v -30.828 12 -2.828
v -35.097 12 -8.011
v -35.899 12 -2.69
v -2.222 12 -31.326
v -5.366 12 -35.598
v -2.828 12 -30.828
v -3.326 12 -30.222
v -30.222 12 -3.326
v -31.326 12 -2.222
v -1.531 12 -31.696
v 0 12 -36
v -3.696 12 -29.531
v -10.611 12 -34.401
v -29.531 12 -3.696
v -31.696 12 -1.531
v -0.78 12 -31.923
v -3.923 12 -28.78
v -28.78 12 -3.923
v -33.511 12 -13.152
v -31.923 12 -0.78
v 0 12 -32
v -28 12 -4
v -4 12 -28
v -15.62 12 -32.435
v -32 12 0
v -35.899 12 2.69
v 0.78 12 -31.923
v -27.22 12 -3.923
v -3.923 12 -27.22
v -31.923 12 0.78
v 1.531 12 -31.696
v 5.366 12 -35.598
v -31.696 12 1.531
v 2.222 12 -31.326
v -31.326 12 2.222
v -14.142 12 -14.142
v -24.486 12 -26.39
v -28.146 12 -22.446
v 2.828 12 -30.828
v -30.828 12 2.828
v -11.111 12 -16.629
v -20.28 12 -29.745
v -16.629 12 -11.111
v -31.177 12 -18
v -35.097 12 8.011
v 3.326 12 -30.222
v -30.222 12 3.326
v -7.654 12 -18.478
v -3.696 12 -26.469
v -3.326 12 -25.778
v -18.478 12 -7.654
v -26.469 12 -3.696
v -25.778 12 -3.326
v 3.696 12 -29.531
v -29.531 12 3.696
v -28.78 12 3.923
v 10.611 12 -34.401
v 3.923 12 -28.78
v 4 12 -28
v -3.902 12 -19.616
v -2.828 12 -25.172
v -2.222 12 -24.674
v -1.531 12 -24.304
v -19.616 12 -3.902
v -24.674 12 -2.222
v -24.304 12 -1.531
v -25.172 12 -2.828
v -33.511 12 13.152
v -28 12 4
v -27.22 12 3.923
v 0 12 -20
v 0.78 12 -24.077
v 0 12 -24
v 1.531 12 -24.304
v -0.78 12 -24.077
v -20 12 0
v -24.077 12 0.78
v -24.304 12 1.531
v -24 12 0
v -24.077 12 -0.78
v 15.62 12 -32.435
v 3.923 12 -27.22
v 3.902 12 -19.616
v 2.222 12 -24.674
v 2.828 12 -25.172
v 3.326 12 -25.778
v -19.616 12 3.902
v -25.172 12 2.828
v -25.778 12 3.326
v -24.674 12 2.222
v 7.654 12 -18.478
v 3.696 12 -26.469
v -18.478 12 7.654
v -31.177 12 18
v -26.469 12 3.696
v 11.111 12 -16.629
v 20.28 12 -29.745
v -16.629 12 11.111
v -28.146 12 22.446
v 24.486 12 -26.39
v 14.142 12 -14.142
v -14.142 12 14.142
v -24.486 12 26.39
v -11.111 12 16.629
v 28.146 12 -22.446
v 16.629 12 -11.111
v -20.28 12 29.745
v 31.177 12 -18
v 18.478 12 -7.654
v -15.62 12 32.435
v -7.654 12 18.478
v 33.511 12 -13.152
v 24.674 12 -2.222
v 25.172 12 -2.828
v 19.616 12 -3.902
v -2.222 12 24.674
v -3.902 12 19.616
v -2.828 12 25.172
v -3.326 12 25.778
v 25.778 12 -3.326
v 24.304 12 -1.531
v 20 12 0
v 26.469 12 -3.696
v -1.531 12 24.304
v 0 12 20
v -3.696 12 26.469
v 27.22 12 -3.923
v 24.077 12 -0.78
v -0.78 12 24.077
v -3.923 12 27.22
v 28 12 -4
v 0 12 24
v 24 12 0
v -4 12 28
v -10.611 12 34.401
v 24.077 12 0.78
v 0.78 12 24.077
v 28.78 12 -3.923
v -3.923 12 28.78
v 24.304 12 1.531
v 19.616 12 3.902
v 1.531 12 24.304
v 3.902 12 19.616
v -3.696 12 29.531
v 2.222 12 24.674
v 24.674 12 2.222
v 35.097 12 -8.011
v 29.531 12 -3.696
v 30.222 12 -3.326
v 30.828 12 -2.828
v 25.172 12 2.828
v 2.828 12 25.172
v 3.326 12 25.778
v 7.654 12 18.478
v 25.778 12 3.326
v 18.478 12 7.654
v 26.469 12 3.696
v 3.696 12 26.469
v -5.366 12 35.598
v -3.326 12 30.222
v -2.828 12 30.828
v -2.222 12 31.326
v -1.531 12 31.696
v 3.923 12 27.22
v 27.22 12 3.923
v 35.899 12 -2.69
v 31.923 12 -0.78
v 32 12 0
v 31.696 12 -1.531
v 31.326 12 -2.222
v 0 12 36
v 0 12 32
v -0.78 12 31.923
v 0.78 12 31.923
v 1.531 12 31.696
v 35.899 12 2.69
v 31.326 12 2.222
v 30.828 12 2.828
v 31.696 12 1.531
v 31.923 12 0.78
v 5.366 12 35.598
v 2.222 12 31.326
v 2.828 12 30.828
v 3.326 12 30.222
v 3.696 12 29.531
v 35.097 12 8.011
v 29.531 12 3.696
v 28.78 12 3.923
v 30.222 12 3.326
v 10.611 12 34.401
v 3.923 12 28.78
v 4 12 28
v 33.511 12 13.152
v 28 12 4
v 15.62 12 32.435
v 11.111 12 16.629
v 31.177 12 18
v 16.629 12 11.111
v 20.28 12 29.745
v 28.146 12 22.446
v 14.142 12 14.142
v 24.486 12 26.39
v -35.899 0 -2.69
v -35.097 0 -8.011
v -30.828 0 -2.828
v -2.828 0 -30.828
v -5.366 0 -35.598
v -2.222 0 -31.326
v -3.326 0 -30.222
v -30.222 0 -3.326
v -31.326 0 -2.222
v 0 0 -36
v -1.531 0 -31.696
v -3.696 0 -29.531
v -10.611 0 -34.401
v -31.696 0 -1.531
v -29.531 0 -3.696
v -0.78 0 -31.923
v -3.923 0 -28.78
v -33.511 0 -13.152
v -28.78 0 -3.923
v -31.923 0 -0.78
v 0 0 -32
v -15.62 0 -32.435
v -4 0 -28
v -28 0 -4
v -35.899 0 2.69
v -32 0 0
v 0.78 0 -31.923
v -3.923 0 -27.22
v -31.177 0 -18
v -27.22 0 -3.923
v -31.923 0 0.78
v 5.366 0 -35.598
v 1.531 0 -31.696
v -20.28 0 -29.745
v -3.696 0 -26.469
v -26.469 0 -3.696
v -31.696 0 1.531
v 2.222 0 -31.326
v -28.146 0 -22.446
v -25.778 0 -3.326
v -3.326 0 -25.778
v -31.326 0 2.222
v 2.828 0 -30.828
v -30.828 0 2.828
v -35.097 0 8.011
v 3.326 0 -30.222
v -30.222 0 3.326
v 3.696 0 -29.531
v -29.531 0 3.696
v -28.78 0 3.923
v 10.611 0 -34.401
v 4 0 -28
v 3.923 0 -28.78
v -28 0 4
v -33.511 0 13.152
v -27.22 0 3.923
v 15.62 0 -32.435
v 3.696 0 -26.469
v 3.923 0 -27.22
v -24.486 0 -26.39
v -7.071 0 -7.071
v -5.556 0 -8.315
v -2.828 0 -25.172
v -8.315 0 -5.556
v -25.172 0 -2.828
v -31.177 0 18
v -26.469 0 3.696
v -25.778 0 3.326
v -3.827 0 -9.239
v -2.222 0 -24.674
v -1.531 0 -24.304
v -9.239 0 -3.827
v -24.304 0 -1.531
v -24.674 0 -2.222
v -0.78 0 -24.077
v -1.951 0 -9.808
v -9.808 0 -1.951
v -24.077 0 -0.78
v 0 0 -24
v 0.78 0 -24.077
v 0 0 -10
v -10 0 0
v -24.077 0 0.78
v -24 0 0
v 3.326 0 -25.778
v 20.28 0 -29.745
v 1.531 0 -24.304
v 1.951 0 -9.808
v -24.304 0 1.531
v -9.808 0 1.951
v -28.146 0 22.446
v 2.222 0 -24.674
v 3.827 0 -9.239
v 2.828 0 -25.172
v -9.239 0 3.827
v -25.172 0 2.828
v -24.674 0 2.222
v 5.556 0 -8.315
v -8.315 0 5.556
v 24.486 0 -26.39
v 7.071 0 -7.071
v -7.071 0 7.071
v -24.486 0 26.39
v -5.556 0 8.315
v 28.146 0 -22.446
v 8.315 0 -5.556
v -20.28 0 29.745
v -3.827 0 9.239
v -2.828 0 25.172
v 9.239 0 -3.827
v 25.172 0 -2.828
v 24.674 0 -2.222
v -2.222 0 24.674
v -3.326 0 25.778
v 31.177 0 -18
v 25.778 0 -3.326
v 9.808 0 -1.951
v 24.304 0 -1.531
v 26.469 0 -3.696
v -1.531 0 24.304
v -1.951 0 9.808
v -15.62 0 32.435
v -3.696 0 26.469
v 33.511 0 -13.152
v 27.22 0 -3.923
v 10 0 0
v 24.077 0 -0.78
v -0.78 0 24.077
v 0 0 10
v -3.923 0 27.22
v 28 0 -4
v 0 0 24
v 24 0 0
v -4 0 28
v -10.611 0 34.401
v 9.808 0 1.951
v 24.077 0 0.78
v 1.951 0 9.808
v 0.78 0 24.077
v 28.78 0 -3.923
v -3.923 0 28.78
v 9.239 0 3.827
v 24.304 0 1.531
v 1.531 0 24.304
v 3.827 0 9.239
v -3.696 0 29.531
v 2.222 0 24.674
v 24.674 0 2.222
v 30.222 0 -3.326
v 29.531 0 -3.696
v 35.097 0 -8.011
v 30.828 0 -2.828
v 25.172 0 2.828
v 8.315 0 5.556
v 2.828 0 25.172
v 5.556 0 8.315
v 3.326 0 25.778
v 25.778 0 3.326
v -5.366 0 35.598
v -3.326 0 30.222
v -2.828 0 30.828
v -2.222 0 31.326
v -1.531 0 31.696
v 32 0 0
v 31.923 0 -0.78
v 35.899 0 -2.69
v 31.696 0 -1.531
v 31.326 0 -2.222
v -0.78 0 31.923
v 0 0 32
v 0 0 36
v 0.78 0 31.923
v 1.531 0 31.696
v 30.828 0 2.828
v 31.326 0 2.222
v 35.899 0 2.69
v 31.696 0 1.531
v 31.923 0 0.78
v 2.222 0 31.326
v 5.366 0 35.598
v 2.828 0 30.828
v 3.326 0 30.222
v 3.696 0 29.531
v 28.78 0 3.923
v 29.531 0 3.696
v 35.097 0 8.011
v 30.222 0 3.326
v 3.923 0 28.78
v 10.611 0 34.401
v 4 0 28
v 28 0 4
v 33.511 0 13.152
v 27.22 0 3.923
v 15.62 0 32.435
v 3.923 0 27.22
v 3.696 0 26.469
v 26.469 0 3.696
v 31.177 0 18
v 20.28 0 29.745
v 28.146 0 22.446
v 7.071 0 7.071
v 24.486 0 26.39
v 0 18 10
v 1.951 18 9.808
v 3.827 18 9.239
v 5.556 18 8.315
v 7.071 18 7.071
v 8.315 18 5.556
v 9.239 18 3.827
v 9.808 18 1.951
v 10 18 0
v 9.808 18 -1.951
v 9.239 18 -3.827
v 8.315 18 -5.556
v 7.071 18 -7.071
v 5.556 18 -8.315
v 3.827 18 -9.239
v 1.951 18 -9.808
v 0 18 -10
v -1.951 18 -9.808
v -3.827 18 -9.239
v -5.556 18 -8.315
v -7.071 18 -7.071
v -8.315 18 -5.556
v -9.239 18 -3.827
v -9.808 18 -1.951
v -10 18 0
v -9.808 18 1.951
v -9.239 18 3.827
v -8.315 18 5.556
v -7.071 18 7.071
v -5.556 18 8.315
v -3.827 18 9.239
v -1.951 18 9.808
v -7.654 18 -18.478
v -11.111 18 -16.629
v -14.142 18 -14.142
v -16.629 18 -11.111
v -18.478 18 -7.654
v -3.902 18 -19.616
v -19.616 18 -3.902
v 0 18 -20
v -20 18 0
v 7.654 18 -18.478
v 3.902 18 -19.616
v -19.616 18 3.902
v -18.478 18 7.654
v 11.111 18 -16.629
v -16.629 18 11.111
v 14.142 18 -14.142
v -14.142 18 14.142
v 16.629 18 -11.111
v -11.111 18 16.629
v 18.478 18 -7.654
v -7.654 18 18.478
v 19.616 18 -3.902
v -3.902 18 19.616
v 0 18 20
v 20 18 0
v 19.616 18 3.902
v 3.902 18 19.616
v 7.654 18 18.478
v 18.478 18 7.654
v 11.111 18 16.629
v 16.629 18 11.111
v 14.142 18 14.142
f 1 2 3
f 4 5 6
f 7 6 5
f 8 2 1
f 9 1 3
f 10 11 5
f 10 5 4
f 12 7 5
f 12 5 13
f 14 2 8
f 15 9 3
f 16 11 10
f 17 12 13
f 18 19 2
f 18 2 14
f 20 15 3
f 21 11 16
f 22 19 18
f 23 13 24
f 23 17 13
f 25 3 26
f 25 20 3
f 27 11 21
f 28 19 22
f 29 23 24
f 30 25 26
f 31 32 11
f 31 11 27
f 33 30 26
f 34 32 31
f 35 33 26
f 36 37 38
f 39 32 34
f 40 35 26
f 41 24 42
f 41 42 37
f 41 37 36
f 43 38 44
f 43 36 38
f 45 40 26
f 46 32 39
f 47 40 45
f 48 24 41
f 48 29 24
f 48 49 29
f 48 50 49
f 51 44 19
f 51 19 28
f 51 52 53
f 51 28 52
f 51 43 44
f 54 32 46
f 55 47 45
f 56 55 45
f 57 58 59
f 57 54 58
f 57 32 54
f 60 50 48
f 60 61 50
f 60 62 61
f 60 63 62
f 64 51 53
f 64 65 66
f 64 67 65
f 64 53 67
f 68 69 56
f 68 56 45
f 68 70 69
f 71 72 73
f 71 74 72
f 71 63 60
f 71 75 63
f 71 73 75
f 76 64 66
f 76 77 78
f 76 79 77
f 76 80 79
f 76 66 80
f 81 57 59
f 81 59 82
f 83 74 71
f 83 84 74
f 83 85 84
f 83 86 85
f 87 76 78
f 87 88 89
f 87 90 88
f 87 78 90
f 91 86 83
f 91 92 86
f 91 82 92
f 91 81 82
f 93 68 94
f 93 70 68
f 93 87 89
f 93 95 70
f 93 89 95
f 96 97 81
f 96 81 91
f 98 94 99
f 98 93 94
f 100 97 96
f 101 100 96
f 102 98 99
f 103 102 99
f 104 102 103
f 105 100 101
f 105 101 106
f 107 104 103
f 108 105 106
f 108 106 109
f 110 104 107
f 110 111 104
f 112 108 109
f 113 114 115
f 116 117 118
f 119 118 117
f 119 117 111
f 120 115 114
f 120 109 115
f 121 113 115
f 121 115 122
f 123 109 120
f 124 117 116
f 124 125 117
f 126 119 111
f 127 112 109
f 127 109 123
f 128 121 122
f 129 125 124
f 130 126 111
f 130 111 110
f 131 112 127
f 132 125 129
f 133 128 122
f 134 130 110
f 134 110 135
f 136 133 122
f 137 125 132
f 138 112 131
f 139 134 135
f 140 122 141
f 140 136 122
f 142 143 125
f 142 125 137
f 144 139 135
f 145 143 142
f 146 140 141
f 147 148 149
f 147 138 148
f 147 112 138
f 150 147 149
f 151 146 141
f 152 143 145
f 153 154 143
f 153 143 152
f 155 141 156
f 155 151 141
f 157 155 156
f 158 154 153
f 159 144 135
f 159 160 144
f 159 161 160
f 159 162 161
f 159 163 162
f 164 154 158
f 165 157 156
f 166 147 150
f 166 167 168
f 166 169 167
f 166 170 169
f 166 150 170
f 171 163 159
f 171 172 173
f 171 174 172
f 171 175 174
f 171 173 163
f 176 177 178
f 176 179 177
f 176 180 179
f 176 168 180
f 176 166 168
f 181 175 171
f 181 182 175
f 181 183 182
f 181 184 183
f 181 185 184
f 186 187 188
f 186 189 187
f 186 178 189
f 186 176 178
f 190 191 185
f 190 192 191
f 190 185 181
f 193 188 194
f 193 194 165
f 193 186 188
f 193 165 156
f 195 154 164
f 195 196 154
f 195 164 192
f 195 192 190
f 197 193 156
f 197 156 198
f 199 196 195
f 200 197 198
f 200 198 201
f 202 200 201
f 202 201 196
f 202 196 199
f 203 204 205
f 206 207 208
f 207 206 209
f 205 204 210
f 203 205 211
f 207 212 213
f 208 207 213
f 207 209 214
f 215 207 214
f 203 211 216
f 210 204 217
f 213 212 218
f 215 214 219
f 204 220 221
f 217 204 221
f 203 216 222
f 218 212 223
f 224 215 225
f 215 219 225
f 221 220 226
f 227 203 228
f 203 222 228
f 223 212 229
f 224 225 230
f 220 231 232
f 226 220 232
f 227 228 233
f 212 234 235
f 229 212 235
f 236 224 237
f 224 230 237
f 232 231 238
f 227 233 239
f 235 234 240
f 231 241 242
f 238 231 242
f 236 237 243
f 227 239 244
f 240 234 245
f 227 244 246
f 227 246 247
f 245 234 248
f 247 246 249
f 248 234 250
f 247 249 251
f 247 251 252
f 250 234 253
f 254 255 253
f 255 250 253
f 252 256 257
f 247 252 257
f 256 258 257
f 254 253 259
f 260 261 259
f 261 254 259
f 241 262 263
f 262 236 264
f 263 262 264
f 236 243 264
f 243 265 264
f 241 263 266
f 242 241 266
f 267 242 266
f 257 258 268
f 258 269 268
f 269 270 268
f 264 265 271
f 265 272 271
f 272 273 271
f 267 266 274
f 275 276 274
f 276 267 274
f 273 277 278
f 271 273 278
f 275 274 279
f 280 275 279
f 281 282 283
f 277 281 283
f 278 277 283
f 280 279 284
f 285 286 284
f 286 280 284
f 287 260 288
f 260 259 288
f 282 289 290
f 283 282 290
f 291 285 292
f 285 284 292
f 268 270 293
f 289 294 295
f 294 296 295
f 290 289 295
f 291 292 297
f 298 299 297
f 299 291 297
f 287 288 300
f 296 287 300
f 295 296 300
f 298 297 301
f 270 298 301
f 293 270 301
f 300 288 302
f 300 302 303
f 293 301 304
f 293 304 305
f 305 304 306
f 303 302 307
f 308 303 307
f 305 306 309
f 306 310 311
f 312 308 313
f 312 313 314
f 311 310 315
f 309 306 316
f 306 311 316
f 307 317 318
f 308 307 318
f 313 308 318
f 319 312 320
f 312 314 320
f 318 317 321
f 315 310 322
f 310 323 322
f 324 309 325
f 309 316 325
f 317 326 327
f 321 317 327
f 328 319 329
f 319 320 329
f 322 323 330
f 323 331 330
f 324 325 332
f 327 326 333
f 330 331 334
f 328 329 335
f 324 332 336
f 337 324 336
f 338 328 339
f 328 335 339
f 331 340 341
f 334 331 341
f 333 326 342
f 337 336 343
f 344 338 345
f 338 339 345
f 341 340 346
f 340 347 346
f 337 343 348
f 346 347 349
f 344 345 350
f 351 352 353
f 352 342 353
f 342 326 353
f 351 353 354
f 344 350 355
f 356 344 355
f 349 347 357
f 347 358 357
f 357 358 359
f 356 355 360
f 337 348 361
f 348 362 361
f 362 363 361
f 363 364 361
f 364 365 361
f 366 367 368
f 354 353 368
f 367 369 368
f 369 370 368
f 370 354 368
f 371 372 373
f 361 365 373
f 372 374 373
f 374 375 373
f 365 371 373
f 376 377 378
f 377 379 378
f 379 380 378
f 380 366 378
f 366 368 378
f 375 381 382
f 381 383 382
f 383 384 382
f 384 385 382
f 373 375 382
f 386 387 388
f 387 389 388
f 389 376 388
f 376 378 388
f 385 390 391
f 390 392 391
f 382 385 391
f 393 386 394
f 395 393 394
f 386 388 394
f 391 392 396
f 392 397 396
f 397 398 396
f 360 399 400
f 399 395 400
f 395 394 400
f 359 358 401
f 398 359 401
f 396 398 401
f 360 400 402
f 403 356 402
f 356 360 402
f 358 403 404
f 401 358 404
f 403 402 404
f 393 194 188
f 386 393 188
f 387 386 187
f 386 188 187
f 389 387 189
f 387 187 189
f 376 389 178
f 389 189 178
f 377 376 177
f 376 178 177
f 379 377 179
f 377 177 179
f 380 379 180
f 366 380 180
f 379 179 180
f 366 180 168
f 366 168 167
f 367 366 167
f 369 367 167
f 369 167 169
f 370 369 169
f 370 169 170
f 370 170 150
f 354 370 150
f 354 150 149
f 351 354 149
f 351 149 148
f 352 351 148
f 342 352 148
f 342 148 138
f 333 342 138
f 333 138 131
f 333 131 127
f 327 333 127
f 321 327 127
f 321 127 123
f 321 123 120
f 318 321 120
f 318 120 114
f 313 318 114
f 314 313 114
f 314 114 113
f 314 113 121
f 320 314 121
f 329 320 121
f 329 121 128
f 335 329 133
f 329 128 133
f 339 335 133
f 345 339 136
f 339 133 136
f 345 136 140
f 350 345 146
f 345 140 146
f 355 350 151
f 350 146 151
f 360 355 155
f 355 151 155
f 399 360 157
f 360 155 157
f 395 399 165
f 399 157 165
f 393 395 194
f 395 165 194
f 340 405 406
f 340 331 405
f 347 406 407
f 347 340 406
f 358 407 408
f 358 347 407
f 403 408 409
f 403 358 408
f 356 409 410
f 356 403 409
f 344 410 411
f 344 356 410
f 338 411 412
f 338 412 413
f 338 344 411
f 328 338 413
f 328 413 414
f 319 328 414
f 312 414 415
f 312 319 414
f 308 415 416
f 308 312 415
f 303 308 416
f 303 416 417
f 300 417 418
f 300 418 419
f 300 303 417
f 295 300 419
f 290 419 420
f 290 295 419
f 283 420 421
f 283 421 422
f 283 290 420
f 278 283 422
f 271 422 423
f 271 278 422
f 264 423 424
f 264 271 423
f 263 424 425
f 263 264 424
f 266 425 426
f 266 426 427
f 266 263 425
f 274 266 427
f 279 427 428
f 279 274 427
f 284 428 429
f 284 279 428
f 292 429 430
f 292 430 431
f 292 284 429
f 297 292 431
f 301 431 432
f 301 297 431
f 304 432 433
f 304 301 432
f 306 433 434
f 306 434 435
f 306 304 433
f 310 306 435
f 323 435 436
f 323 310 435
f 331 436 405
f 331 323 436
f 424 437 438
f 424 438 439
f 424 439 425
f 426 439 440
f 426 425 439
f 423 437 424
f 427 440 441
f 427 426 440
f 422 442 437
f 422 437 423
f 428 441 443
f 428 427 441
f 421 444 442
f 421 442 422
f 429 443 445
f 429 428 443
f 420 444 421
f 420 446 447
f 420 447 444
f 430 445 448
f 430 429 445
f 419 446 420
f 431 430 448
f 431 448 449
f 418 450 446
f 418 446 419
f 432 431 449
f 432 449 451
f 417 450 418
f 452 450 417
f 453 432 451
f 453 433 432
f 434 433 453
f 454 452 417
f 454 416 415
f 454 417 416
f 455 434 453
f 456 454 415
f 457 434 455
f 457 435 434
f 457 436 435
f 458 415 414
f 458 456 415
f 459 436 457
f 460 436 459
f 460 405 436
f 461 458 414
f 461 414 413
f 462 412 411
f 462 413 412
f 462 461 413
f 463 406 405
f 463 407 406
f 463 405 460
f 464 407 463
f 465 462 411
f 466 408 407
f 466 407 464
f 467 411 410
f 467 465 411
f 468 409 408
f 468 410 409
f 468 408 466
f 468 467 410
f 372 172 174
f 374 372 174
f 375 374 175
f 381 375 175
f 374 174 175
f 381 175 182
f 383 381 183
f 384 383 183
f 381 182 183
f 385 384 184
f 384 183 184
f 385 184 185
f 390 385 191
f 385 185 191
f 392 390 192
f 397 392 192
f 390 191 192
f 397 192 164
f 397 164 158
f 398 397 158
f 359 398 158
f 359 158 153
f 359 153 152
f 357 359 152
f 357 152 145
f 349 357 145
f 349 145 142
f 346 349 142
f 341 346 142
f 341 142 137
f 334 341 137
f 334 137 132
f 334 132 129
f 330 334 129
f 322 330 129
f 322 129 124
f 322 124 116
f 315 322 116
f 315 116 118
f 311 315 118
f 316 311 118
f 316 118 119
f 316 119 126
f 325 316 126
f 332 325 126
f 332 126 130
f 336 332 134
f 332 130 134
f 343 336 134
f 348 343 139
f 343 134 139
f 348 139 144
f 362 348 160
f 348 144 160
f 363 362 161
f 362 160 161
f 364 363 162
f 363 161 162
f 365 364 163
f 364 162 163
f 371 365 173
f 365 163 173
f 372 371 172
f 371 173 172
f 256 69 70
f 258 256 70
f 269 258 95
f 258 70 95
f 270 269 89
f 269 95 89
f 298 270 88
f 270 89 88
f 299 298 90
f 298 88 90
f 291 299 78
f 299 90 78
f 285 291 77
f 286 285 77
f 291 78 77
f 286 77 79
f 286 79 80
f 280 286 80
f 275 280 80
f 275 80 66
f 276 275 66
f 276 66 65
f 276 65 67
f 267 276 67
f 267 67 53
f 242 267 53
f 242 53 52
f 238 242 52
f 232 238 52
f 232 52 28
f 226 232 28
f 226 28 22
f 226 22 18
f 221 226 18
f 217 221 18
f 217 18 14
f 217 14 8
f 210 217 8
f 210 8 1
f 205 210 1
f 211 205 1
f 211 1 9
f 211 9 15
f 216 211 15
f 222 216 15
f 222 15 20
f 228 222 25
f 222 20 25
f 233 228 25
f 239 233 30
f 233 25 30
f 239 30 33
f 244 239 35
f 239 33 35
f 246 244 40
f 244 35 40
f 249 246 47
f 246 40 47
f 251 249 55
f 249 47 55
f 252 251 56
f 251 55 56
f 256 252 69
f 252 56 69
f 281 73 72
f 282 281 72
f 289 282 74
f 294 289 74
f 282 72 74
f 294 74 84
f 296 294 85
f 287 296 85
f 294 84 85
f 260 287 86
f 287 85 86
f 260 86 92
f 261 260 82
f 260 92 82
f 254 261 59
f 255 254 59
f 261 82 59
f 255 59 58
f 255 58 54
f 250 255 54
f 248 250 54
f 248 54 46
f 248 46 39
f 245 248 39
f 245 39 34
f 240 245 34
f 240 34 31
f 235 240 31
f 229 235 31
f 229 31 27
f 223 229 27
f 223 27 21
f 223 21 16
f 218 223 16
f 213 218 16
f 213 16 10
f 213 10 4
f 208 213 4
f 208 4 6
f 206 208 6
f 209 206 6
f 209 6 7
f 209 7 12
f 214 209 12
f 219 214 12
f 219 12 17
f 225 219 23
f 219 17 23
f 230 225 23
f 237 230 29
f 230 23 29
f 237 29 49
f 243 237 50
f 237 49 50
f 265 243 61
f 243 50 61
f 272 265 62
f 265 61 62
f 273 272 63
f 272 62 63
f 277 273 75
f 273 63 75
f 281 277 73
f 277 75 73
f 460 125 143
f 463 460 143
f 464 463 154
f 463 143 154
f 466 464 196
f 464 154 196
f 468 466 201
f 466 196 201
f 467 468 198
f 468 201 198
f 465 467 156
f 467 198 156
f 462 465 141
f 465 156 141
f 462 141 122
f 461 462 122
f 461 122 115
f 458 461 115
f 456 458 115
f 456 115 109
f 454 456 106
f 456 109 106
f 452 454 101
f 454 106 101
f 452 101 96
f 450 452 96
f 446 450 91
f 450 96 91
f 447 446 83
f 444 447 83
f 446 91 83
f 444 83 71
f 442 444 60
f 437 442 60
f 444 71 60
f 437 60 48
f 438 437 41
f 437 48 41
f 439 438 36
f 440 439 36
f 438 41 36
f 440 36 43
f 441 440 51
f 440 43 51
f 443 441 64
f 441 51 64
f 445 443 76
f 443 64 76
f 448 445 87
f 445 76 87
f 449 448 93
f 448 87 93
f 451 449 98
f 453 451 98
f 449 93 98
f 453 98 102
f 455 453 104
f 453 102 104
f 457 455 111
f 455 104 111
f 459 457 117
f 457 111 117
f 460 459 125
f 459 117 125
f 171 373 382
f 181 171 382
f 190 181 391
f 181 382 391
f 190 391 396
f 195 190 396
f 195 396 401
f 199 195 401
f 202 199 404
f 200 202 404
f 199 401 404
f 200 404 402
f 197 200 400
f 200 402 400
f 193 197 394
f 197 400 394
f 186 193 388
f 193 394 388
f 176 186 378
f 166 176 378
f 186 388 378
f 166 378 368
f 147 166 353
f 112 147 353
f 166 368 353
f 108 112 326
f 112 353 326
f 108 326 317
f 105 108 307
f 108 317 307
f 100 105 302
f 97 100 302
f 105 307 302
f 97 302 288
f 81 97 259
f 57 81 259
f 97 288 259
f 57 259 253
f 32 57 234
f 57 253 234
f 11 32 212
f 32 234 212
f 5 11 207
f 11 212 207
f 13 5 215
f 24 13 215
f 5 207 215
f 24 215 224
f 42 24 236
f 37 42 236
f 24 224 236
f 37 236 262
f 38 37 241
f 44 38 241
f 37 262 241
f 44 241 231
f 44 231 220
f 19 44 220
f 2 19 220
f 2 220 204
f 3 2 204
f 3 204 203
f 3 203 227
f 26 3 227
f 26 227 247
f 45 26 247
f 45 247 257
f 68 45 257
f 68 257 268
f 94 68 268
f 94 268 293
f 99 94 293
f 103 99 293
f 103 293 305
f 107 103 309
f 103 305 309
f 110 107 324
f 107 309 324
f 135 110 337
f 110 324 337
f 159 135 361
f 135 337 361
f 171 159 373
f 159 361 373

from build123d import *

# Parameters (mm, degrees)
SKETCH1_R           = 36
SKETCH1_R_2         = 10
BOSS_EXTRUDE1_DEPTH = 12
SKETCH2_R           = 20
SKETCH2_R_2         = 10
BOSS_EXTRUDE2_DEPTH = 6
CUT_EXTRUDE1_REACH  = 54.307
SKETCH3_R           = 4


with BuildPart() as part:
    # Sketch1 → Boss-Extrude1 (new body)
    with BuildSketch(Plane(origin=(0, 0, 0), x_dir=(1, 0, 0), z_dir=(0, 1, 0))):
        with Locations(Location((0, 0, 0), (0, 0, 270))):
            Circle(SKETCH1_R)
        with Locations(Location((0, 0, 0), (0, 0, 270))):
            Circle(SKETCH1_R_2, mode=Mode.SUBTRACT)
    extrude(amount=BOSS_EXTRUDE1_DEPTH)

    # Sketch2 → Boss-Extrude2 (add)
    with BuildSketch(Plane(origin=(0, 12, 0), x_dir=(1, 0, 0), z_dir=(0, 1, 0))):
        with Locations(Location((0, 0, 0), (0, 0, 270))):
            Circle(SKETCH2_R)
        with Locations(Location((0, 0, 0), (0, 0, 270))):
            Circle(SKETCH2_R_2, mode=Mode.SUBTRACT)
    extrude(amount=BOSS_EXTRUDE2_DEPTH)

    # Sketch3 → Cut-Extrude1 (cut, up to next)
    with BuildSketch(Plane(origin=(0, 12, 0), x_dir=(1, 0, 0), z_dir=(0, 1, 0)), mode=Mode.PRIVATE) as cut_extrude1_sk1:
        with Locations(Location((0, -28, 0), (0, 0, 270))):
            Circle(SKETCH3_R)
    cut_extrude1_tool1 = extrude(cut_extrude1_sk1.sketch, amount=-CUT_EXTRUDE1_REACH, mode=Mode.PRIVATE) & part.part
    # Sketch3 → Cut-Extrude1 (cut, up to next)
    with BuildSketch(Plane(origin=(0, 12, 0), x_dir=(1, 0, 0), z_dir=(0, 1, 0)), mode=Mode.PRIVATE) as cut_extrude1_sk2:
        with Locations(Location((-28, 0, 0), (0, 0, 270))):
            Circle(SKETCH3_R)
    cut_extrude1_tool2 = extrude(cut_extrude1_sk2.sketch, amount=-CUT_EXTRUDE1_REACH, mode=Mode.PRIVATE) & part.part
    # Sketch3 → Cut-Extrude1 (cut, up to next)
    with BuildSketch(Plane(origin=(0, 12, 0), x_dir=(1, 0, 0), z_dir=(0, 1, 0)), mode=Mode.PRIVATE) as cut_extrude1_sk3:
        with Locations(Location((0, 28, 0), (0, 0, 270))):
            Circle(SKETCH3_R)
    cut_extrude1_tool3 = extrude(cut_extrude1_sk3.sketch, amount=-CUT_EXTRUDE1_REACH, mode=Mode.PRIVATE) & part.part
    # Sketch3 → Cut-Extrude1 (cut, up to next)
    with BuildSketch(Plane(origin=(0, 12, 0), x_dir=(1, 0, 0), z_dir=(0, 1, 0)), mode=Mode.PRIVATE) as cut_extrude1_sk4:
        with Locations(Location((28, 0, 0), (0, 0, 270))):
            Circle(SKETCH3_R)
    cut_extrude1_tool4 = extrude(cut_extrude1_sk4.sketch, amount=-CUT_EXTRUDE1_REACH, mode=Mode.PRIVATE) & part.part
    add(cut_extrude1_tool1.solids().sort_by_distance((0, 12, 28))[0], mode=Mode.SUBTRACT)
    add(cut_extrude1_tool2.solids().sort_by_distance((-28, 12, 0))[0], mode=Mode.SUBTRACT)
    add(cut_extrude1_tool3.solids().sort_by_distance((0, 12, -28))[0], mode=Mode.SUBTRACT)
    add(cut_extrude1_tool4.solids().sort_by_distance((28, 12, 0))[0], mode=Mode.SUBTRACT)


solid = part.part
